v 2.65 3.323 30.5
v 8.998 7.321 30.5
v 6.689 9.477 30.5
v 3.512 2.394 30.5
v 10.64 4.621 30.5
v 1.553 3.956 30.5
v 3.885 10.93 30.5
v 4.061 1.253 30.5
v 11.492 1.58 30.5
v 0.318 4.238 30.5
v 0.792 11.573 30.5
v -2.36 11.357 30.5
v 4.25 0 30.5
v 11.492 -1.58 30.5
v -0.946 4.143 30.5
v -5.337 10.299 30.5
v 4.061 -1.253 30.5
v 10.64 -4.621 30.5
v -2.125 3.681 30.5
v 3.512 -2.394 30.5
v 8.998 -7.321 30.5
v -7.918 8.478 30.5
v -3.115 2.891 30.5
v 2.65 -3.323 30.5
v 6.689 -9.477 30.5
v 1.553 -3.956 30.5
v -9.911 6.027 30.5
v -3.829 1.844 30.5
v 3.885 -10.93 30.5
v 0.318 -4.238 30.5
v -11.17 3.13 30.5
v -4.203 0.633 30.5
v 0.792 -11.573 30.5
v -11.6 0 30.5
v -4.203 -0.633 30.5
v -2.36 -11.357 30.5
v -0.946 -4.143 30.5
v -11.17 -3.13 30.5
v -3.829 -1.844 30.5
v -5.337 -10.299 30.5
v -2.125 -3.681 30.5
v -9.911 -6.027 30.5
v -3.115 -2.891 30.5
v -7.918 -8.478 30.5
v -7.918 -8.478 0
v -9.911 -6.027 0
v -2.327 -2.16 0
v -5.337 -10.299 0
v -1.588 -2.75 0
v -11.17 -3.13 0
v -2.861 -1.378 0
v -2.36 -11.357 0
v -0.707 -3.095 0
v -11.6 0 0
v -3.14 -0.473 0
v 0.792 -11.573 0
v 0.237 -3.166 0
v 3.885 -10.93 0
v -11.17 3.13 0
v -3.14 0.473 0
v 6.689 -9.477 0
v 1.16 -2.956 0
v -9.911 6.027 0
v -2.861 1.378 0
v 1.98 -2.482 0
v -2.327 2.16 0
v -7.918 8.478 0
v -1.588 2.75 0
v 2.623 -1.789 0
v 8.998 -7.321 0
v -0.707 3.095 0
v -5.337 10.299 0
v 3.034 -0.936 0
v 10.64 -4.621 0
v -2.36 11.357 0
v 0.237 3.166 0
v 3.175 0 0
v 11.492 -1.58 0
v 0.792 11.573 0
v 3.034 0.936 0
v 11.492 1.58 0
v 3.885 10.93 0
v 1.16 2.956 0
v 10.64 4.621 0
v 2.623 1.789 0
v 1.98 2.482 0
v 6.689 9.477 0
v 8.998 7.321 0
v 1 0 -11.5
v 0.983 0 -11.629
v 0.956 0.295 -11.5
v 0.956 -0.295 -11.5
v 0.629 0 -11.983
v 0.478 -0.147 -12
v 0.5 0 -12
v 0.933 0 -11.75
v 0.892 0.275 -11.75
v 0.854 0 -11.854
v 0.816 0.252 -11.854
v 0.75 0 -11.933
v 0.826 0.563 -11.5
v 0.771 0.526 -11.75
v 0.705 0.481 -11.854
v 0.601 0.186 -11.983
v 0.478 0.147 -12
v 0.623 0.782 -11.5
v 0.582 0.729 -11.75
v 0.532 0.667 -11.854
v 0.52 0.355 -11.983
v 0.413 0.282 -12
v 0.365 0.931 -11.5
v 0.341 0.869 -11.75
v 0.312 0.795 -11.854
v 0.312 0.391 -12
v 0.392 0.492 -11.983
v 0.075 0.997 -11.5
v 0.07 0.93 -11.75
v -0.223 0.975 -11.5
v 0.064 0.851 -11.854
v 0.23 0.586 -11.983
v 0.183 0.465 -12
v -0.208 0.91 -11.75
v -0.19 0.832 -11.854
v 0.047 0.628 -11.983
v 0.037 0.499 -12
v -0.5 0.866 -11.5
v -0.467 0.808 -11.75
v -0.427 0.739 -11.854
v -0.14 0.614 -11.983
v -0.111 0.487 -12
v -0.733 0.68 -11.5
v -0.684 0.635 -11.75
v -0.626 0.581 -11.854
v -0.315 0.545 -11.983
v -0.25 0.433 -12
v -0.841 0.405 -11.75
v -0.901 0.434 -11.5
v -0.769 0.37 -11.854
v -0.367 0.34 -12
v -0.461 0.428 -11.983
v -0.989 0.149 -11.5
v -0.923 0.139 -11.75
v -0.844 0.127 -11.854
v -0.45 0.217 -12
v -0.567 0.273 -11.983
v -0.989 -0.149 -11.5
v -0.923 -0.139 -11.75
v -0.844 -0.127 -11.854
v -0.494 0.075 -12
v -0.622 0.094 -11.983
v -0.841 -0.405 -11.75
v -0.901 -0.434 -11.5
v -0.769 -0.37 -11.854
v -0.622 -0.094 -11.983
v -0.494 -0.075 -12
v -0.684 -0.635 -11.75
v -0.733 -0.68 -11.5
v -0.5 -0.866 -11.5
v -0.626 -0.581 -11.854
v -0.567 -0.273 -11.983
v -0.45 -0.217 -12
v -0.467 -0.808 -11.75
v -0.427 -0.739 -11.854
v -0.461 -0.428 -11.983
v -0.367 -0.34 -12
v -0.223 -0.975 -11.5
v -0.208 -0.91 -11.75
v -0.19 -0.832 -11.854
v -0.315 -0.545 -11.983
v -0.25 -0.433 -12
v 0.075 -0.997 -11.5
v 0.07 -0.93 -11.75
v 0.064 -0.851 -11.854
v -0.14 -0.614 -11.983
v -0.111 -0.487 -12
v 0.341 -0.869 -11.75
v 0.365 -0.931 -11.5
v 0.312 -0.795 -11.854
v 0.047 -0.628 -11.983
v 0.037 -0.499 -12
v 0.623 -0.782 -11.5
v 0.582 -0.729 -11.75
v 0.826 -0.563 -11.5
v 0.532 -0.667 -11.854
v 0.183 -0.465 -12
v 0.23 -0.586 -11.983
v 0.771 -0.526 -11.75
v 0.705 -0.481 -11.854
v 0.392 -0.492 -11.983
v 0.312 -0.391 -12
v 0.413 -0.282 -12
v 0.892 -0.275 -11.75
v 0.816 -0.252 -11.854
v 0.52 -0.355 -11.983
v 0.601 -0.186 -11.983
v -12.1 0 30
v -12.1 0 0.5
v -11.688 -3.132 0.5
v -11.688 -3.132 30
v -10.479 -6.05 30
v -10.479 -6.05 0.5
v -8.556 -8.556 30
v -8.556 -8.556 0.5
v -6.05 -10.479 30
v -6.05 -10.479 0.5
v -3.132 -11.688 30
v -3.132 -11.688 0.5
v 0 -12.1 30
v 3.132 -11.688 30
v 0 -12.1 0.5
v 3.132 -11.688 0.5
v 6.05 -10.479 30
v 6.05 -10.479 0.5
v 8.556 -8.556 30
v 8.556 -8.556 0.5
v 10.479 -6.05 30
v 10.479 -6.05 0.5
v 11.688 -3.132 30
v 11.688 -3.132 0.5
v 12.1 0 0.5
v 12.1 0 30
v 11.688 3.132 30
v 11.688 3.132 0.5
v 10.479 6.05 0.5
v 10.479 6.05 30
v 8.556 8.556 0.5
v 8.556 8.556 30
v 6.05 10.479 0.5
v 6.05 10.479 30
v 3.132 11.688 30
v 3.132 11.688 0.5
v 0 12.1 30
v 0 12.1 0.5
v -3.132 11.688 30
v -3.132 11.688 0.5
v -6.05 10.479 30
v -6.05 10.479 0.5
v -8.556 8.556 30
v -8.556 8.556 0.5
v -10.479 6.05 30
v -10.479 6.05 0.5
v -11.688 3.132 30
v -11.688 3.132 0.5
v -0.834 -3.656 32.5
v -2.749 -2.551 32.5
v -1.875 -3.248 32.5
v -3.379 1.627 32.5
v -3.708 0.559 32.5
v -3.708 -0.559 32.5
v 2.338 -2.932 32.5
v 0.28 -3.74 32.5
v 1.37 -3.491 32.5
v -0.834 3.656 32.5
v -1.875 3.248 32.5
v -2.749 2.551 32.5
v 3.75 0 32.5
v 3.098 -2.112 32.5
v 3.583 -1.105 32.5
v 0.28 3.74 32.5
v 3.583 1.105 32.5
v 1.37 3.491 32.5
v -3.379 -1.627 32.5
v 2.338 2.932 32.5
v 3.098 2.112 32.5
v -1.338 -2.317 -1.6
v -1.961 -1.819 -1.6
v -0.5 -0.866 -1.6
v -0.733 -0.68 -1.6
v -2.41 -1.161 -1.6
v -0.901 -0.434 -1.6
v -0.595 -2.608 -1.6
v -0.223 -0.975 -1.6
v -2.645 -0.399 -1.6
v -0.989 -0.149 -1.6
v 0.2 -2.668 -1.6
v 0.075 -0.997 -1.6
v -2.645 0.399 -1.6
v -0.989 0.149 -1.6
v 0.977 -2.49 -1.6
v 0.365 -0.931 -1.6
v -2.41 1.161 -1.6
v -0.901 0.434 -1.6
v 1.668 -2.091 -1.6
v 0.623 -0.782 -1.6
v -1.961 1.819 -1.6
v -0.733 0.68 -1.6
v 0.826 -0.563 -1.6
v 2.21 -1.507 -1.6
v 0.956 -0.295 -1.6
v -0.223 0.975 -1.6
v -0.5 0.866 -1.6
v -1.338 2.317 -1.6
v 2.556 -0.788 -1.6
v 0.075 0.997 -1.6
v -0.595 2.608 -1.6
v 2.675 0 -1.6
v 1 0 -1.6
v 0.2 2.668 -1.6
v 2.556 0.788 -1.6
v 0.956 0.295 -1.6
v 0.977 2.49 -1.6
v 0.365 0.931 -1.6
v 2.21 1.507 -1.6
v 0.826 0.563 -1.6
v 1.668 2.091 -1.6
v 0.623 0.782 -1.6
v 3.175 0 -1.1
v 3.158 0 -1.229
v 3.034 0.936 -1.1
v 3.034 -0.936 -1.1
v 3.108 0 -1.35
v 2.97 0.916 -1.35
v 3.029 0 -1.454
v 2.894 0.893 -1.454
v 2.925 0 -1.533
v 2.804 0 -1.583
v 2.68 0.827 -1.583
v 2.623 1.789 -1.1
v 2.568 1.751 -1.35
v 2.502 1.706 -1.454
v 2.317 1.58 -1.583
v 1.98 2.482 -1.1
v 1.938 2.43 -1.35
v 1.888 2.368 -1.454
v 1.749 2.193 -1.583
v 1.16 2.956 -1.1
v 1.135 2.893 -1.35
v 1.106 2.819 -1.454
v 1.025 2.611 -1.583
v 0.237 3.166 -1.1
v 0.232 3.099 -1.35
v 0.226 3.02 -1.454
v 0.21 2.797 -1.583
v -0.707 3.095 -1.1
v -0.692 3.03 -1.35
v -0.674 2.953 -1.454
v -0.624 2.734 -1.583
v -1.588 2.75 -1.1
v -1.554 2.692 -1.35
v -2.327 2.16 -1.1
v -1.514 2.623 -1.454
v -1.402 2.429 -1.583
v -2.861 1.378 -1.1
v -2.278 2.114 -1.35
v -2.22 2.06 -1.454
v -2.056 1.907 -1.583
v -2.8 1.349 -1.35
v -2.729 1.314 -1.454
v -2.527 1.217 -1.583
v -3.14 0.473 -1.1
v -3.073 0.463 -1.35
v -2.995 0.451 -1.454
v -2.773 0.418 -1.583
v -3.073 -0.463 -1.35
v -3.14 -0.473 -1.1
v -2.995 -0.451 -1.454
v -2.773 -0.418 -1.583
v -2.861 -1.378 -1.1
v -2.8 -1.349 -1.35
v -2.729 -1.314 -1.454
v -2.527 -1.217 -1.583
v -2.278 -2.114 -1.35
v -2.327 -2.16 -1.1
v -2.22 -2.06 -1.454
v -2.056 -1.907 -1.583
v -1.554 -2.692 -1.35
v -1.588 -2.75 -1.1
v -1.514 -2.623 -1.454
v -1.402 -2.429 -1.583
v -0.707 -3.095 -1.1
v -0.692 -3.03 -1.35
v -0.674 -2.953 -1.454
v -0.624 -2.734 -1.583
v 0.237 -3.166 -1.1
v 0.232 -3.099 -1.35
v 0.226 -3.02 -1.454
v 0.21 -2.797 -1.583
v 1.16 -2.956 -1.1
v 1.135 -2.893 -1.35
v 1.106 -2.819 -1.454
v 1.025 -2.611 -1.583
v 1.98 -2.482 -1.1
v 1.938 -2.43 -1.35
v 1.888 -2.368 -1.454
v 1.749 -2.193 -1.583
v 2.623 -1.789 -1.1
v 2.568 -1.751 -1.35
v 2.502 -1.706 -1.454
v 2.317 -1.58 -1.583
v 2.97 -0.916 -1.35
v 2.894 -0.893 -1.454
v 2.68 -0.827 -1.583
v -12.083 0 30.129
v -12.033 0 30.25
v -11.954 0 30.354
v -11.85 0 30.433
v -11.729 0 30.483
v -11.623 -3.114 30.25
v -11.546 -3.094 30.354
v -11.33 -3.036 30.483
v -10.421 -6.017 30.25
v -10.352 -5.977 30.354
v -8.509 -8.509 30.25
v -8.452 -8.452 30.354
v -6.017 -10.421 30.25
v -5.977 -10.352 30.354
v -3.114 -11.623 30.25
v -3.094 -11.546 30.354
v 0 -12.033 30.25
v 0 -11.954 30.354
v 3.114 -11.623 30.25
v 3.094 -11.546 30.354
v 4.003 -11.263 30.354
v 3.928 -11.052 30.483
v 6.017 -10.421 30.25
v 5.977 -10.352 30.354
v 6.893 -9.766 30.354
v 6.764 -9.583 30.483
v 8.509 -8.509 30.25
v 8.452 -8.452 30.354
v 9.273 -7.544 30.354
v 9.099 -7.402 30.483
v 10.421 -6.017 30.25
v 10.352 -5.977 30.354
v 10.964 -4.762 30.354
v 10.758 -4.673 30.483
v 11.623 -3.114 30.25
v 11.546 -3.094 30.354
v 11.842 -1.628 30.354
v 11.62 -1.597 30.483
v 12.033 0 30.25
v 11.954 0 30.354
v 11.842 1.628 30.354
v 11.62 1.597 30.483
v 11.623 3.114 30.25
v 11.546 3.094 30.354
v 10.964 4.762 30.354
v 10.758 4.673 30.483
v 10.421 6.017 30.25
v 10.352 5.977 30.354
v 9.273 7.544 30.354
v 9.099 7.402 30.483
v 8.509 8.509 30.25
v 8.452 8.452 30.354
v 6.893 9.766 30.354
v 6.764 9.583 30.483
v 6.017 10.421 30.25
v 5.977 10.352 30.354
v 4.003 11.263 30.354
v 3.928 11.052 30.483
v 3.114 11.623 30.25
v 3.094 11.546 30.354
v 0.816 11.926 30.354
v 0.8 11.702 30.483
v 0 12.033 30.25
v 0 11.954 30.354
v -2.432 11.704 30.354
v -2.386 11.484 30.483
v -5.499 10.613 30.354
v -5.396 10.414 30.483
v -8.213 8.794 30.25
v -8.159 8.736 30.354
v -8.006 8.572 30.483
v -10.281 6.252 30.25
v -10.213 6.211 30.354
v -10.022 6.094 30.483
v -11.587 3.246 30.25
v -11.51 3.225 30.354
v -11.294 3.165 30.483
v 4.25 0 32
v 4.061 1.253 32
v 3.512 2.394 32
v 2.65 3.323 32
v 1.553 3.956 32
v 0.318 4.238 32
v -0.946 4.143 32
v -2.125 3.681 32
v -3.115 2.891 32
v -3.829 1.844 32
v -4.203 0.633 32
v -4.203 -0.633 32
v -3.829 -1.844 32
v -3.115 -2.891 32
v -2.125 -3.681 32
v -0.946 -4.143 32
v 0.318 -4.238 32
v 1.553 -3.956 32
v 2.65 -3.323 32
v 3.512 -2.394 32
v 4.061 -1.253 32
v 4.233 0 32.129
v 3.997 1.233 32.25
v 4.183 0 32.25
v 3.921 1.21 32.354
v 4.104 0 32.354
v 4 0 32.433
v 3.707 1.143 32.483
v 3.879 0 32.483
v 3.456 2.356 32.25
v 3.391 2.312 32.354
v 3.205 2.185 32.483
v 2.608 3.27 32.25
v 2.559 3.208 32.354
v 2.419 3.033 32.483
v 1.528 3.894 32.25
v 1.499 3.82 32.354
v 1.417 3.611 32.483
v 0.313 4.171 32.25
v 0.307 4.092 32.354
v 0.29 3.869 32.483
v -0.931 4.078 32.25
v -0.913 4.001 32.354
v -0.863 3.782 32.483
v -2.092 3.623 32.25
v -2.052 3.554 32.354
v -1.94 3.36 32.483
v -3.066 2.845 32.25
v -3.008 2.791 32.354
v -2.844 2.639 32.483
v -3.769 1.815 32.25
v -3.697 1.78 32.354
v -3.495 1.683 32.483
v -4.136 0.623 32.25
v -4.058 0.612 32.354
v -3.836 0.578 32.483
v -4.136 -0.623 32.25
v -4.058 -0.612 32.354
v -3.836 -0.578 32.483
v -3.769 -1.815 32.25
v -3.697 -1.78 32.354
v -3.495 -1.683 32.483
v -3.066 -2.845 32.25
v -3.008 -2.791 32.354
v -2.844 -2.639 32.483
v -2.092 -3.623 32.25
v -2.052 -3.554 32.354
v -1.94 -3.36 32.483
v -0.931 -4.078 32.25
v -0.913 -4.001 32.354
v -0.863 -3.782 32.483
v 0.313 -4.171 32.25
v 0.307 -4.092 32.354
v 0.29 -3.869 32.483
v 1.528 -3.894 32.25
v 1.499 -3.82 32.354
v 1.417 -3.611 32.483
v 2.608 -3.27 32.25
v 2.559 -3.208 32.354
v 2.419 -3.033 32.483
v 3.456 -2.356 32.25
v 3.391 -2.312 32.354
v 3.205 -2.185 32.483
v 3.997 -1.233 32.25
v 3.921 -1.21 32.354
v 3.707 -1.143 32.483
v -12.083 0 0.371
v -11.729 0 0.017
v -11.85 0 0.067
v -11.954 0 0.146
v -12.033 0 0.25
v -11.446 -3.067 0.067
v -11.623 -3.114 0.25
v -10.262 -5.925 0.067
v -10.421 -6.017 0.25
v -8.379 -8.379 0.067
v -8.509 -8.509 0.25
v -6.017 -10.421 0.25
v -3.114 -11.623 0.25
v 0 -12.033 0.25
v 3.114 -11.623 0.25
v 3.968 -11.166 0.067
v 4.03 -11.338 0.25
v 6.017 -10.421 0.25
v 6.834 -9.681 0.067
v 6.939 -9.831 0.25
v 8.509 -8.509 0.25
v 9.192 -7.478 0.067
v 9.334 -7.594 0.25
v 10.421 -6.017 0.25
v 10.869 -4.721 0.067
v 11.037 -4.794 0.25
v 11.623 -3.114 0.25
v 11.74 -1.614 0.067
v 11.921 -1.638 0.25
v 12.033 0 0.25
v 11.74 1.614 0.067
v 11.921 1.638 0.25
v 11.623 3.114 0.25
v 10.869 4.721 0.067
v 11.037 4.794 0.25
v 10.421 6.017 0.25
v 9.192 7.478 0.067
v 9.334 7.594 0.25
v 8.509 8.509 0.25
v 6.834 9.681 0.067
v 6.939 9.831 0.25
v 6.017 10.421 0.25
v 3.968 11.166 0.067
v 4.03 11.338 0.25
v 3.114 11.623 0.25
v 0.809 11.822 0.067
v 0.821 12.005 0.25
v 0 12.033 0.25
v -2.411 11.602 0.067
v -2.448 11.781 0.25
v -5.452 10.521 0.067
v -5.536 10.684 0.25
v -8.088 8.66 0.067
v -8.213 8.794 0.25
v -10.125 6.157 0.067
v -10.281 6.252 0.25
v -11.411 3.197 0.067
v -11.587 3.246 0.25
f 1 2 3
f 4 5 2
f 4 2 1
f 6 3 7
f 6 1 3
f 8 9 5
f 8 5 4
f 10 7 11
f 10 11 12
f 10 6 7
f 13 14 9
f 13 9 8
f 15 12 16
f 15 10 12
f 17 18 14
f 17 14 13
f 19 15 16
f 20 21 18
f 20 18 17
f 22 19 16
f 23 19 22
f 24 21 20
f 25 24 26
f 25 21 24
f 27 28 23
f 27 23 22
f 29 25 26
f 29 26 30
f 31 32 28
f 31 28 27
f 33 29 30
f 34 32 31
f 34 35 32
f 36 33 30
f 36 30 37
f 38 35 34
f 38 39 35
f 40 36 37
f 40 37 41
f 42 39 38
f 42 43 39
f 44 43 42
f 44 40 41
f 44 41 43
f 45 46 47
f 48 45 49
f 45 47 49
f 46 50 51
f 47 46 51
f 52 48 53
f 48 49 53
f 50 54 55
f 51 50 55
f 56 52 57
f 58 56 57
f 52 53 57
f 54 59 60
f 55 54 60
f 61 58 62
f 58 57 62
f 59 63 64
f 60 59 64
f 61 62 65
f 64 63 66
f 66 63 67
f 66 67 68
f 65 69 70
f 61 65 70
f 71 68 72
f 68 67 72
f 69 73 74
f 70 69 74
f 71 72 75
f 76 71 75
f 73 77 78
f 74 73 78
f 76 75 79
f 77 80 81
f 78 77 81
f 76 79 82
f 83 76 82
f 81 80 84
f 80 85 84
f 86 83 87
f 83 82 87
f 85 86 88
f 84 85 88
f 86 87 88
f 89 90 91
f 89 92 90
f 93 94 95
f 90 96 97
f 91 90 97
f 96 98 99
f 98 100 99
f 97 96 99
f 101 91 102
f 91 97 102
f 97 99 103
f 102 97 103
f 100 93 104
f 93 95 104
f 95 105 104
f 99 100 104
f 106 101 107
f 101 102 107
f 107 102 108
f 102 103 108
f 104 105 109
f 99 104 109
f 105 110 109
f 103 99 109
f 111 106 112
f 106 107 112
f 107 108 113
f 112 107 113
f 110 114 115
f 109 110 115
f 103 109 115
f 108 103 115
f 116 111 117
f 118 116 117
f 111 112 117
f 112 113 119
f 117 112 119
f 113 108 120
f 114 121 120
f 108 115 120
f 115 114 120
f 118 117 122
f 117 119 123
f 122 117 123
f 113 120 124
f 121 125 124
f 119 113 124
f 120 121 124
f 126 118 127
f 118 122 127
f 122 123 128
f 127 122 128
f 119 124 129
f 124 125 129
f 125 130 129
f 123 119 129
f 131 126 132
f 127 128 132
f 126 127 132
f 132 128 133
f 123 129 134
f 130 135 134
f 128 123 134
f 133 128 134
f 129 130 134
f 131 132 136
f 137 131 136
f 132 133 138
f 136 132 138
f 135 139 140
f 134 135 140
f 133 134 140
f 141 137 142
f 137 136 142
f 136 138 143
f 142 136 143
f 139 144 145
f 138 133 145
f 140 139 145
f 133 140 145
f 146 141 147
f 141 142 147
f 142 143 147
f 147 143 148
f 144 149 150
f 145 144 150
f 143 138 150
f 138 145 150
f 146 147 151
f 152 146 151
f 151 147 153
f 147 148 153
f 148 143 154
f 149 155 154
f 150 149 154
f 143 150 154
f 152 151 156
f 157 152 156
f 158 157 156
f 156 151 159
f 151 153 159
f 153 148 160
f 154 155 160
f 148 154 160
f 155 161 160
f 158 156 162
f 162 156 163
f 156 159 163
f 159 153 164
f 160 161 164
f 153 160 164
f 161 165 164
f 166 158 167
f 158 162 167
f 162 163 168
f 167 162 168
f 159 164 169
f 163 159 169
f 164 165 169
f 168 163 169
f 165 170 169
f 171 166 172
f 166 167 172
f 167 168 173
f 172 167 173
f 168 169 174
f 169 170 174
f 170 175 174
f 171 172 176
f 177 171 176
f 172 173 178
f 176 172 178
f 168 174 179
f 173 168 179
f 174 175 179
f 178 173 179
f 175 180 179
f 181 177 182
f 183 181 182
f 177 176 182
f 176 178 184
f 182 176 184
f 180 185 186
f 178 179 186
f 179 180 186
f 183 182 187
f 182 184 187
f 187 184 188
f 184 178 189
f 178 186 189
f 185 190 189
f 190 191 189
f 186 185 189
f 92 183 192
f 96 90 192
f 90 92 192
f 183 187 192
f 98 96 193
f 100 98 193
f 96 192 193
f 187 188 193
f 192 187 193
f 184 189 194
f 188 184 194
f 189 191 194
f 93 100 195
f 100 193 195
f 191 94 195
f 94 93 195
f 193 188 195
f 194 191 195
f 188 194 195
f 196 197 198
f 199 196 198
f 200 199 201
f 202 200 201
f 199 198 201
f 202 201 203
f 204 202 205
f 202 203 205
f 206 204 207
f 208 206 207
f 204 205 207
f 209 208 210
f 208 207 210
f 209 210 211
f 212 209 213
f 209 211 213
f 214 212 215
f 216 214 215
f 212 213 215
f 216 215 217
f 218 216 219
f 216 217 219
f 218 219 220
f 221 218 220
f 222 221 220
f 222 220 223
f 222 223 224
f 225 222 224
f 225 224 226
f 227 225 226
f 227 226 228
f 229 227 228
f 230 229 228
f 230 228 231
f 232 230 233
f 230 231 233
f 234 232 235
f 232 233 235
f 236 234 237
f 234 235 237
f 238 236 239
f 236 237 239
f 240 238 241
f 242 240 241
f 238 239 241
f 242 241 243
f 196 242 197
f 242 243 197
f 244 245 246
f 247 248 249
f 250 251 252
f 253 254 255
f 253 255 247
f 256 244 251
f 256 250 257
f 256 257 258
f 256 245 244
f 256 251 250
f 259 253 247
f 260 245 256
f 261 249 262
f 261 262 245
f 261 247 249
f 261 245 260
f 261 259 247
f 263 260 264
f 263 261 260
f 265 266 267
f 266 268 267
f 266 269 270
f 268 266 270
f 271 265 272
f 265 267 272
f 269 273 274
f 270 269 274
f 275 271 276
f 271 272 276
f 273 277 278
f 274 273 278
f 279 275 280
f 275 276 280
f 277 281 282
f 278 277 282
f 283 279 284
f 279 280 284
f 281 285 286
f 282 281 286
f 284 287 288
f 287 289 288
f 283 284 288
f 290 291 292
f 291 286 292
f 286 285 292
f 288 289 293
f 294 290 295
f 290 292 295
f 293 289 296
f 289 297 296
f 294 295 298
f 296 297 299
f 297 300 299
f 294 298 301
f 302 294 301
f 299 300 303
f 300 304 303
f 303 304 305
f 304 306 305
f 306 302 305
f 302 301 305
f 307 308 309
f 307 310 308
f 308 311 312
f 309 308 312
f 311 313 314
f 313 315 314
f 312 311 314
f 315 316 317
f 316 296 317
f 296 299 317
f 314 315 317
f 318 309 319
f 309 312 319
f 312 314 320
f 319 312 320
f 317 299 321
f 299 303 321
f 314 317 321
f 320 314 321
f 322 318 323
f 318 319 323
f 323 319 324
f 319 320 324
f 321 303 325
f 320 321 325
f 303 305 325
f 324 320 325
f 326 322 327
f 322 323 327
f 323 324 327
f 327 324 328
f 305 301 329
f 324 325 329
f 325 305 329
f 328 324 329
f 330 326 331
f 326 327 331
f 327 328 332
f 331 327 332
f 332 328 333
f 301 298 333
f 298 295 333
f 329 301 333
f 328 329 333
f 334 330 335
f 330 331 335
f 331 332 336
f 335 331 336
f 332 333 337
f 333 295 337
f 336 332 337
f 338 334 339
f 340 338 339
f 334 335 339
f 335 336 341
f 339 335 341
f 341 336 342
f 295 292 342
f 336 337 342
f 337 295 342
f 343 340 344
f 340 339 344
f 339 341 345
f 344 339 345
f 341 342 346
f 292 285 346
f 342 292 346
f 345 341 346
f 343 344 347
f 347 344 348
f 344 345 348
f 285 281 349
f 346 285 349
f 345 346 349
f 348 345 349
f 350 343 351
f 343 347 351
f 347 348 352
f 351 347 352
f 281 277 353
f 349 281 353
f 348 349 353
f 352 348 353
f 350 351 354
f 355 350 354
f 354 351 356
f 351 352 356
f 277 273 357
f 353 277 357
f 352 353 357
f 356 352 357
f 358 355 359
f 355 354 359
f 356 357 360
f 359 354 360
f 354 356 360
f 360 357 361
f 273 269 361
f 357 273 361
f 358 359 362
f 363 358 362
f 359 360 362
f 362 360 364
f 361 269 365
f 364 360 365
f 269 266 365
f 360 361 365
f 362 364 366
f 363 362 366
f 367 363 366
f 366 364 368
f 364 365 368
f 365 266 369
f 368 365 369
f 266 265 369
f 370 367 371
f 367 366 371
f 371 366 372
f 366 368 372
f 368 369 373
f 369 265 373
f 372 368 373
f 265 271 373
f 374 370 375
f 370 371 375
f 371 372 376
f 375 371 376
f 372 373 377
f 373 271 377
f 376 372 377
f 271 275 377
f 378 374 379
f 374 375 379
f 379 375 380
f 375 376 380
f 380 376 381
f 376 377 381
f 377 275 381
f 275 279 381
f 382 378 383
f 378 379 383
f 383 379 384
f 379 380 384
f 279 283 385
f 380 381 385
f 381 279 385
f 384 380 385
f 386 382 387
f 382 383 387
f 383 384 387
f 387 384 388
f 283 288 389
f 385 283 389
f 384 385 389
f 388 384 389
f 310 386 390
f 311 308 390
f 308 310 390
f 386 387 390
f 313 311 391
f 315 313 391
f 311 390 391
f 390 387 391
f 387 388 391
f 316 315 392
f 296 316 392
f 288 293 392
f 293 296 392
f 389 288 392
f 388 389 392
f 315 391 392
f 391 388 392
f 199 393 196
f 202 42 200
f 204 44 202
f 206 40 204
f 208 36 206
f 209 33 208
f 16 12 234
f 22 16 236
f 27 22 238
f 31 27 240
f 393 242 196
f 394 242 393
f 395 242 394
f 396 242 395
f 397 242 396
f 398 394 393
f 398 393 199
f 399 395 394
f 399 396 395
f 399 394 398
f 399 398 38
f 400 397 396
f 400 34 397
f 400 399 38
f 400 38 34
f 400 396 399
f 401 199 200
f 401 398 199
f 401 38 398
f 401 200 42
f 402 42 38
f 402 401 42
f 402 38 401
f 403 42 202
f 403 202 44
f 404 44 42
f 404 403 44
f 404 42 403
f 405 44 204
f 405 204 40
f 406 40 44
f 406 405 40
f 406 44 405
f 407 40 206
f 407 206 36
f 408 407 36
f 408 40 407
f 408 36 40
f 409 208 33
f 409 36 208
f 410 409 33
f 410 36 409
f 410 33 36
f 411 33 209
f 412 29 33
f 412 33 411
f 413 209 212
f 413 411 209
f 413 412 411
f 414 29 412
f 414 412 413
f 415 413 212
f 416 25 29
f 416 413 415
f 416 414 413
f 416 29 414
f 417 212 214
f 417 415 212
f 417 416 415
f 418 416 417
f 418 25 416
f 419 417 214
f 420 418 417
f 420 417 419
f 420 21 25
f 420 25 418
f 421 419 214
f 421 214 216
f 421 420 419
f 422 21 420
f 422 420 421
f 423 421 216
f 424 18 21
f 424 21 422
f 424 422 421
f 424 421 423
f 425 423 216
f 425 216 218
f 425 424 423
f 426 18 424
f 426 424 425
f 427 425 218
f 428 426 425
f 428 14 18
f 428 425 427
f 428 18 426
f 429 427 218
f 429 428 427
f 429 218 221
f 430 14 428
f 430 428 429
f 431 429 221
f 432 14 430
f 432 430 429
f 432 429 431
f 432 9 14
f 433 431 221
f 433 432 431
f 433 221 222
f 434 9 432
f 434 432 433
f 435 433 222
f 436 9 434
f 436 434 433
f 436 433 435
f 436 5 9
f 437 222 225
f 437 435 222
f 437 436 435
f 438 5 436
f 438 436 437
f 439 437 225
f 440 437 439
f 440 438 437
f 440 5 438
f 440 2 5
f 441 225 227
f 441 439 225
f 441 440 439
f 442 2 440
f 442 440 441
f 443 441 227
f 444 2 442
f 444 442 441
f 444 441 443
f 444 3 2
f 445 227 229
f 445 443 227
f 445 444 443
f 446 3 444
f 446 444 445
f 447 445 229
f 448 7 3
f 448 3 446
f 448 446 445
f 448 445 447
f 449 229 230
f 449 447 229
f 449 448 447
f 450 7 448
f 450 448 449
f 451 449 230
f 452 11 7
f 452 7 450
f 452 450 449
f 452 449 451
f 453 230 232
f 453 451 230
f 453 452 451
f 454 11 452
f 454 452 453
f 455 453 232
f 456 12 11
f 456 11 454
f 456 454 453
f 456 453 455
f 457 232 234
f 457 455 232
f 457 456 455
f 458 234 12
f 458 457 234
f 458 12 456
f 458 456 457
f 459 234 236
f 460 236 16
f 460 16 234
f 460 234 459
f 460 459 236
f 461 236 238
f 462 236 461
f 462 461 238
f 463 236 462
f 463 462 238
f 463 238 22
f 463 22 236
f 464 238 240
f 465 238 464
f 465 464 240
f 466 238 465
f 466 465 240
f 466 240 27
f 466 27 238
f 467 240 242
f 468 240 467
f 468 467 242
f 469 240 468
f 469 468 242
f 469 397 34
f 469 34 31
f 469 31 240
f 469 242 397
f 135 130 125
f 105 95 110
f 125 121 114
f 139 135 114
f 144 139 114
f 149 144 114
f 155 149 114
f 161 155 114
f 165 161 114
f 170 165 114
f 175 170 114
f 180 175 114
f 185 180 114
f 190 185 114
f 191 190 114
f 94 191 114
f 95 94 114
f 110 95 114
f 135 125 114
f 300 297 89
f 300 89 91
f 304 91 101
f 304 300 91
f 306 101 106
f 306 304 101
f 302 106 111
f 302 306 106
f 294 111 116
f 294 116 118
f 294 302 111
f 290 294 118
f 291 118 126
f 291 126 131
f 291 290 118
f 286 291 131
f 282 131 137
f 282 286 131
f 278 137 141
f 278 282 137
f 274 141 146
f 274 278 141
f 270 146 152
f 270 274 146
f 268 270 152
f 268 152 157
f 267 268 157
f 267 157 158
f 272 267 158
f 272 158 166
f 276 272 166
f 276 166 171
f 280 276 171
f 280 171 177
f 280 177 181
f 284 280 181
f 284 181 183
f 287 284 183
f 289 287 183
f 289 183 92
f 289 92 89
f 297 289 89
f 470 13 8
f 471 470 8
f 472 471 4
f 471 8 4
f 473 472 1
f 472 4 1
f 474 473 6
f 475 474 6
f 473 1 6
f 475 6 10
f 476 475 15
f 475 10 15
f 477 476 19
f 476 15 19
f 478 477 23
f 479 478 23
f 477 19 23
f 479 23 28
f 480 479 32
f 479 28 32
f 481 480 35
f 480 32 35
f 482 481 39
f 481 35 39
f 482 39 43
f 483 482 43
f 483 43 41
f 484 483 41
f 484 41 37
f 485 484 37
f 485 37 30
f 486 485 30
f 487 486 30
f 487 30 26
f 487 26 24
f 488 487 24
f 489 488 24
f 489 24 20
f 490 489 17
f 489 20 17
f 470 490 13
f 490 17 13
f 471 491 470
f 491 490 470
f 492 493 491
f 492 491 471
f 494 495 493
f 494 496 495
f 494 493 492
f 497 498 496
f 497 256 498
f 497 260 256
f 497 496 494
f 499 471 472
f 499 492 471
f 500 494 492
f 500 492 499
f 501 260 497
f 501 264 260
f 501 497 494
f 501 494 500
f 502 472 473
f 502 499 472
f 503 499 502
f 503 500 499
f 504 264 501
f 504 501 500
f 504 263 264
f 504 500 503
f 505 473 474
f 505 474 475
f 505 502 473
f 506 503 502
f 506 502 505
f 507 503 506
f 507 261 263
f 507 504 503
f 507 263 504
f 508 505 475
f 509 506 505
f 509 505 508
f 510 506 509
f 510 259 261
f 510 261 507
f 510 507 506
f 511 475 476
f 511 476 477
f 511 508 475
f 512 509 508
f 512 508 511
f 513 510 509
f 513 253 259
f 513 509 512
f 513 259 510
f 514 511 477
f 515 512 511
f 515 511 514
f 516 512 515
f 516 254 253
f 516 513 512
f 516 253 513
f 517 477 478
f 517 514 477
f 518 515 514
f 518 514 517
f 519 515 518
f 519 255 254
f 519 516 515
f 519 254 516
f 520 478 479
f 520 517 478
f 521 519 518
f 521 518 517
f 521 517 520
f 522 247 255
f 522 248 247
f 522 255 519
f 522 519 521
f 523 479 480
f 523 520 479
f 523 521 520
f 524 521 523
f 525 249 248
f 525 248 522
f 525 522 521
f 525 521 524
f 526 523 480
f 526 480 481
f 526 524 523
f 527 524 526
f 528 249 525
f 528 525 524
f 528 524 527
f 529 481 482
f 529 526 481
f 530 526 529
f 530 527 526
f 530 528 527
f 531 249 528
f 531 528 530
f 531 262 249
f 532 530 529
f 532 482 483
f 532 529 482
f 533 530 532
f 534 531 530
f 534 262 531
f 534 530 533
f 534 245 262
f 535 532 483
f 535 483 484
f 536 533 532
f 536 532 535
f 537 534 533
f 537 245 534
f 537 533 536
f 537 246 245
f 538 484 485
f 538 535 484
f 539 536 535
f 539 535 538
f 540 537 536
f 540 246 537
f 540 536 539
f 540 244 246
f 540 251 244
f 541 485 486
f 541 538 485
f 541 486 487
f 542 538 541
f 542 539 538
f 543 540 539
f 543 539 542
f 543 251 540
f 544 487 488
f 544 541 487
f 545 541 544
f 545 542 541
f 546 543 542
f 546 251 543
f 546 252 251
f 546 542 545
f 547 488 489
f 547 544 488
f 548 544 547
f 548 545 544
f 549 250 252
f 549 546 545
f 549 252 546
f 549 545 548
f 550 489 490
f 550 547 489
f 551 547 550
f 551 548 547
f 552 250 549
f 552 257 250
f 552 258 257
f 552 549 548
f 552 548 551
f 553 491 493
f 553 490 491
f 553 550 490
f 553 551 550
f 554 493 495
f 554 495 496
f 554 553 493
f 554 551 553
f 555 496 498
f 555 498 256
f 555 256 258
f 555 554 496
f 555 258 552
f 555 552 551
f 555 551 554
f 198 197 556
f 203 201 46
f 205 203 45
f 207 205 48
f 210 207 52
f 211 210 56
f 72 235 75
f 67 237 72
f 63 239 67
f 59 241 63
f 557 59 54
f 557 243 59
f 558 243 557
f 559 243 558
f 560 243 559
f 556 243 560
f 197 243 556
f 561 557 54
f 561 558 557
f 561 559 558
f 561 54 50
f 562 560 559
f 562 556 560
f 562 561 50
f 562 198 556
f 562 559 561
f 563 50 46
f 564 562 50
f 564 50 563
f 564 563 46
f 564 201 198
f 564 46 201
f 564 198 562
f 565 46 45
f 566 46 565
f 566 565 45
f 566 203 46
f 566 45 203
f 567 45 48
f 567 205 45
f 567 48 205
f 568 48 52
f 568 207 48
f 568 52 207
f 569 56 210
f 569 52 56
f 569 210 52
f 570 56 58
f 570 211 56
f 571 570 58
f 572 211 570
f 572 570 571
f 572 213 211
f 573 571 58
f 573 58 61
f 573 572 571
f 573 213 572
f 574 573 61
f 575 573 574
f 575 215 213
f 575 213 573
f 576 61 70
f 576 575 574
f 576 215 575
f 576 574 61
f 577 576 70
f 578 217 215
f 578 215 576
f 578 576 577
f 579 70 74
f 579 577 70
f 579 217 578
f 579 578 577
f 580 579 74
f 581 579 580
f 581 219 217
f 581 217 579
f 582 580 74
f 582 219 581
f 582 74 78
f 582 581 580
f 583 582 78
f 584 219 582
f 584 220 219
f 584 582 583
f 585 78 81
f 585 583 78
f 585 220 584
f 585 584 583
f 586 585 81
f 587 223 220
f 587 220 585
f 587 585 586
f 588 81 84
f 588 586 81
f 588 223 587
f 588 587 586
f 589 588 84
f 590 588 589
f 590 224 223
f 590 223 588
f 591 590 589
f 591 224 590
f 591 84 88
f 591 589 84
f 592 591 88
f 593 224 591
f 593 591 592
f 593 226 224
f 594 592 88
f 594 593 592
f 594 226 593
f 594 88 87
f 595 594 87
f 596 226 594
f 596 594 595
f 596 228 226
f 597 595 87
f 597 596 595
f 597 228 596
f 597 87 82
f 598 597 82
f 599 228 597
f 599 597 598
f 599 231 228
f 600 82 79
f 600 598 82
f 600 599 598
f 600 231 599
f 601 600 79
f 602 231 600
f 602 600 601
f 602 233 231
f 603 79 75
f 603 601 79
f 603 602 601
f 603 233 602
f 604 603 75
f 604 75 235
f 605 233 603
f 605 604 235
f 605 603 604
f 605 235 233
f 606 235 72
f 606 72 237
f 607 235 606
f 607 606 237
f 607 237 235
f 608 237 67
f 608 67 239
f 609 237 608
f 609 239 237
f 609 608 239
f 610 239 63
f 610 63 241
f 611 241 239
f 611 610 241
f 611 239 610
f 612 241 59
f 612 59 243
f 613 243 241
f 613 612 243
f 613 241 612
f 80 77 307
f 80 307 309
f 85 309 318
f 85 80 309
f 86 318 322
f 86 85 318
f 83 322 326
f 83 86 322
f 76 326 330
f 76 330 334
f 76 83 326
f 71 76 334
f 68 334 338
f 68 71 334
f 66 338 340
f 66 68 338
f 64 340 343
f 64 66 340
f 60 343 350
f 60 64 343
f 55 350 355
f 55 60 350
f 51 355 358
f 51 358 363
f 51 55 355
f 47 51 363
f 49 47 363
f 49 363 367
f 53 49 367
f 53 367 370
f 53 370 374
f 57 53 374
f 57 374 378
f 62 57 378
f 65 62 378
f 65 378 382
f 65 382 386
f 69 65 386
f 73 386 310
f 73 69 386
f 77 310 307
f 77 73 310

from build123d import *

# Parameters (mm, degrees)
SKETCH1_R           = 12.1
BOSS_EXTRUDE1_DEPTH = 30.5
SKETCH1_3_R         = 1
BOSS_EXTRUDE2_DEPTH = 12
SKETCH1_4_R         = 3.175
SKETCH1_4_R_2       = 1
BOSS_EXTRUDE3_DEPTH = 1.6
SKETCH2_R           = 4.25
BOSS_EXTRUDE4_DEPTH = 2
FILLET1_R           = 0.5


with BuildPart() as part:
    # Sketch1 → Boss-Extrude1 (new body)
    with BuildSketch(Plane.XY):
        Circle(SKETCH1_R)
    extrude(amount=BOSS_EXTRUDE1_DEPTH)

    # Sketch1<3> → Boss-Extrude2 (add)
    with BuildSketch(Plane.XY):
        Circle(SKETCH1_3_R)
    extrude(amount=-BOSS_EXTRUDE2_DEPTH)

    # Sketch1<4> → Boss-Extrude3 (add)
    with BuildSketch(Plane.XY):
        Circle(SKETCH1_4_R)
        Circle(SKETCH1_4_R_2, mode=Mode.SUBTRACT)
    extrude(amount=-BOSS_EXTRUDE3_DEPTH)

    # Sketch2 → Boss-Extrude4 (add)
    with BuildSketch(Plane.XY.offset(30.5)):
        Circle(SKETCH2_R)
    extrude(amount=BOSS_EXTRUDE4_DEPTH)

    # Fillet1
    fillet1_edges = [part.edges().sort_by_distance(p)[0] for p in [
        (-1, 0, -12),
        (-3.175, 0, -1.6),
        (-12.1, 0, 0),
        (-4.25, 0, 32.5),
        (-12.1, 0, 30.5),
    ]]
    fillet(fillet1_edges, radius=FILLET1_R)


solid = part.part
